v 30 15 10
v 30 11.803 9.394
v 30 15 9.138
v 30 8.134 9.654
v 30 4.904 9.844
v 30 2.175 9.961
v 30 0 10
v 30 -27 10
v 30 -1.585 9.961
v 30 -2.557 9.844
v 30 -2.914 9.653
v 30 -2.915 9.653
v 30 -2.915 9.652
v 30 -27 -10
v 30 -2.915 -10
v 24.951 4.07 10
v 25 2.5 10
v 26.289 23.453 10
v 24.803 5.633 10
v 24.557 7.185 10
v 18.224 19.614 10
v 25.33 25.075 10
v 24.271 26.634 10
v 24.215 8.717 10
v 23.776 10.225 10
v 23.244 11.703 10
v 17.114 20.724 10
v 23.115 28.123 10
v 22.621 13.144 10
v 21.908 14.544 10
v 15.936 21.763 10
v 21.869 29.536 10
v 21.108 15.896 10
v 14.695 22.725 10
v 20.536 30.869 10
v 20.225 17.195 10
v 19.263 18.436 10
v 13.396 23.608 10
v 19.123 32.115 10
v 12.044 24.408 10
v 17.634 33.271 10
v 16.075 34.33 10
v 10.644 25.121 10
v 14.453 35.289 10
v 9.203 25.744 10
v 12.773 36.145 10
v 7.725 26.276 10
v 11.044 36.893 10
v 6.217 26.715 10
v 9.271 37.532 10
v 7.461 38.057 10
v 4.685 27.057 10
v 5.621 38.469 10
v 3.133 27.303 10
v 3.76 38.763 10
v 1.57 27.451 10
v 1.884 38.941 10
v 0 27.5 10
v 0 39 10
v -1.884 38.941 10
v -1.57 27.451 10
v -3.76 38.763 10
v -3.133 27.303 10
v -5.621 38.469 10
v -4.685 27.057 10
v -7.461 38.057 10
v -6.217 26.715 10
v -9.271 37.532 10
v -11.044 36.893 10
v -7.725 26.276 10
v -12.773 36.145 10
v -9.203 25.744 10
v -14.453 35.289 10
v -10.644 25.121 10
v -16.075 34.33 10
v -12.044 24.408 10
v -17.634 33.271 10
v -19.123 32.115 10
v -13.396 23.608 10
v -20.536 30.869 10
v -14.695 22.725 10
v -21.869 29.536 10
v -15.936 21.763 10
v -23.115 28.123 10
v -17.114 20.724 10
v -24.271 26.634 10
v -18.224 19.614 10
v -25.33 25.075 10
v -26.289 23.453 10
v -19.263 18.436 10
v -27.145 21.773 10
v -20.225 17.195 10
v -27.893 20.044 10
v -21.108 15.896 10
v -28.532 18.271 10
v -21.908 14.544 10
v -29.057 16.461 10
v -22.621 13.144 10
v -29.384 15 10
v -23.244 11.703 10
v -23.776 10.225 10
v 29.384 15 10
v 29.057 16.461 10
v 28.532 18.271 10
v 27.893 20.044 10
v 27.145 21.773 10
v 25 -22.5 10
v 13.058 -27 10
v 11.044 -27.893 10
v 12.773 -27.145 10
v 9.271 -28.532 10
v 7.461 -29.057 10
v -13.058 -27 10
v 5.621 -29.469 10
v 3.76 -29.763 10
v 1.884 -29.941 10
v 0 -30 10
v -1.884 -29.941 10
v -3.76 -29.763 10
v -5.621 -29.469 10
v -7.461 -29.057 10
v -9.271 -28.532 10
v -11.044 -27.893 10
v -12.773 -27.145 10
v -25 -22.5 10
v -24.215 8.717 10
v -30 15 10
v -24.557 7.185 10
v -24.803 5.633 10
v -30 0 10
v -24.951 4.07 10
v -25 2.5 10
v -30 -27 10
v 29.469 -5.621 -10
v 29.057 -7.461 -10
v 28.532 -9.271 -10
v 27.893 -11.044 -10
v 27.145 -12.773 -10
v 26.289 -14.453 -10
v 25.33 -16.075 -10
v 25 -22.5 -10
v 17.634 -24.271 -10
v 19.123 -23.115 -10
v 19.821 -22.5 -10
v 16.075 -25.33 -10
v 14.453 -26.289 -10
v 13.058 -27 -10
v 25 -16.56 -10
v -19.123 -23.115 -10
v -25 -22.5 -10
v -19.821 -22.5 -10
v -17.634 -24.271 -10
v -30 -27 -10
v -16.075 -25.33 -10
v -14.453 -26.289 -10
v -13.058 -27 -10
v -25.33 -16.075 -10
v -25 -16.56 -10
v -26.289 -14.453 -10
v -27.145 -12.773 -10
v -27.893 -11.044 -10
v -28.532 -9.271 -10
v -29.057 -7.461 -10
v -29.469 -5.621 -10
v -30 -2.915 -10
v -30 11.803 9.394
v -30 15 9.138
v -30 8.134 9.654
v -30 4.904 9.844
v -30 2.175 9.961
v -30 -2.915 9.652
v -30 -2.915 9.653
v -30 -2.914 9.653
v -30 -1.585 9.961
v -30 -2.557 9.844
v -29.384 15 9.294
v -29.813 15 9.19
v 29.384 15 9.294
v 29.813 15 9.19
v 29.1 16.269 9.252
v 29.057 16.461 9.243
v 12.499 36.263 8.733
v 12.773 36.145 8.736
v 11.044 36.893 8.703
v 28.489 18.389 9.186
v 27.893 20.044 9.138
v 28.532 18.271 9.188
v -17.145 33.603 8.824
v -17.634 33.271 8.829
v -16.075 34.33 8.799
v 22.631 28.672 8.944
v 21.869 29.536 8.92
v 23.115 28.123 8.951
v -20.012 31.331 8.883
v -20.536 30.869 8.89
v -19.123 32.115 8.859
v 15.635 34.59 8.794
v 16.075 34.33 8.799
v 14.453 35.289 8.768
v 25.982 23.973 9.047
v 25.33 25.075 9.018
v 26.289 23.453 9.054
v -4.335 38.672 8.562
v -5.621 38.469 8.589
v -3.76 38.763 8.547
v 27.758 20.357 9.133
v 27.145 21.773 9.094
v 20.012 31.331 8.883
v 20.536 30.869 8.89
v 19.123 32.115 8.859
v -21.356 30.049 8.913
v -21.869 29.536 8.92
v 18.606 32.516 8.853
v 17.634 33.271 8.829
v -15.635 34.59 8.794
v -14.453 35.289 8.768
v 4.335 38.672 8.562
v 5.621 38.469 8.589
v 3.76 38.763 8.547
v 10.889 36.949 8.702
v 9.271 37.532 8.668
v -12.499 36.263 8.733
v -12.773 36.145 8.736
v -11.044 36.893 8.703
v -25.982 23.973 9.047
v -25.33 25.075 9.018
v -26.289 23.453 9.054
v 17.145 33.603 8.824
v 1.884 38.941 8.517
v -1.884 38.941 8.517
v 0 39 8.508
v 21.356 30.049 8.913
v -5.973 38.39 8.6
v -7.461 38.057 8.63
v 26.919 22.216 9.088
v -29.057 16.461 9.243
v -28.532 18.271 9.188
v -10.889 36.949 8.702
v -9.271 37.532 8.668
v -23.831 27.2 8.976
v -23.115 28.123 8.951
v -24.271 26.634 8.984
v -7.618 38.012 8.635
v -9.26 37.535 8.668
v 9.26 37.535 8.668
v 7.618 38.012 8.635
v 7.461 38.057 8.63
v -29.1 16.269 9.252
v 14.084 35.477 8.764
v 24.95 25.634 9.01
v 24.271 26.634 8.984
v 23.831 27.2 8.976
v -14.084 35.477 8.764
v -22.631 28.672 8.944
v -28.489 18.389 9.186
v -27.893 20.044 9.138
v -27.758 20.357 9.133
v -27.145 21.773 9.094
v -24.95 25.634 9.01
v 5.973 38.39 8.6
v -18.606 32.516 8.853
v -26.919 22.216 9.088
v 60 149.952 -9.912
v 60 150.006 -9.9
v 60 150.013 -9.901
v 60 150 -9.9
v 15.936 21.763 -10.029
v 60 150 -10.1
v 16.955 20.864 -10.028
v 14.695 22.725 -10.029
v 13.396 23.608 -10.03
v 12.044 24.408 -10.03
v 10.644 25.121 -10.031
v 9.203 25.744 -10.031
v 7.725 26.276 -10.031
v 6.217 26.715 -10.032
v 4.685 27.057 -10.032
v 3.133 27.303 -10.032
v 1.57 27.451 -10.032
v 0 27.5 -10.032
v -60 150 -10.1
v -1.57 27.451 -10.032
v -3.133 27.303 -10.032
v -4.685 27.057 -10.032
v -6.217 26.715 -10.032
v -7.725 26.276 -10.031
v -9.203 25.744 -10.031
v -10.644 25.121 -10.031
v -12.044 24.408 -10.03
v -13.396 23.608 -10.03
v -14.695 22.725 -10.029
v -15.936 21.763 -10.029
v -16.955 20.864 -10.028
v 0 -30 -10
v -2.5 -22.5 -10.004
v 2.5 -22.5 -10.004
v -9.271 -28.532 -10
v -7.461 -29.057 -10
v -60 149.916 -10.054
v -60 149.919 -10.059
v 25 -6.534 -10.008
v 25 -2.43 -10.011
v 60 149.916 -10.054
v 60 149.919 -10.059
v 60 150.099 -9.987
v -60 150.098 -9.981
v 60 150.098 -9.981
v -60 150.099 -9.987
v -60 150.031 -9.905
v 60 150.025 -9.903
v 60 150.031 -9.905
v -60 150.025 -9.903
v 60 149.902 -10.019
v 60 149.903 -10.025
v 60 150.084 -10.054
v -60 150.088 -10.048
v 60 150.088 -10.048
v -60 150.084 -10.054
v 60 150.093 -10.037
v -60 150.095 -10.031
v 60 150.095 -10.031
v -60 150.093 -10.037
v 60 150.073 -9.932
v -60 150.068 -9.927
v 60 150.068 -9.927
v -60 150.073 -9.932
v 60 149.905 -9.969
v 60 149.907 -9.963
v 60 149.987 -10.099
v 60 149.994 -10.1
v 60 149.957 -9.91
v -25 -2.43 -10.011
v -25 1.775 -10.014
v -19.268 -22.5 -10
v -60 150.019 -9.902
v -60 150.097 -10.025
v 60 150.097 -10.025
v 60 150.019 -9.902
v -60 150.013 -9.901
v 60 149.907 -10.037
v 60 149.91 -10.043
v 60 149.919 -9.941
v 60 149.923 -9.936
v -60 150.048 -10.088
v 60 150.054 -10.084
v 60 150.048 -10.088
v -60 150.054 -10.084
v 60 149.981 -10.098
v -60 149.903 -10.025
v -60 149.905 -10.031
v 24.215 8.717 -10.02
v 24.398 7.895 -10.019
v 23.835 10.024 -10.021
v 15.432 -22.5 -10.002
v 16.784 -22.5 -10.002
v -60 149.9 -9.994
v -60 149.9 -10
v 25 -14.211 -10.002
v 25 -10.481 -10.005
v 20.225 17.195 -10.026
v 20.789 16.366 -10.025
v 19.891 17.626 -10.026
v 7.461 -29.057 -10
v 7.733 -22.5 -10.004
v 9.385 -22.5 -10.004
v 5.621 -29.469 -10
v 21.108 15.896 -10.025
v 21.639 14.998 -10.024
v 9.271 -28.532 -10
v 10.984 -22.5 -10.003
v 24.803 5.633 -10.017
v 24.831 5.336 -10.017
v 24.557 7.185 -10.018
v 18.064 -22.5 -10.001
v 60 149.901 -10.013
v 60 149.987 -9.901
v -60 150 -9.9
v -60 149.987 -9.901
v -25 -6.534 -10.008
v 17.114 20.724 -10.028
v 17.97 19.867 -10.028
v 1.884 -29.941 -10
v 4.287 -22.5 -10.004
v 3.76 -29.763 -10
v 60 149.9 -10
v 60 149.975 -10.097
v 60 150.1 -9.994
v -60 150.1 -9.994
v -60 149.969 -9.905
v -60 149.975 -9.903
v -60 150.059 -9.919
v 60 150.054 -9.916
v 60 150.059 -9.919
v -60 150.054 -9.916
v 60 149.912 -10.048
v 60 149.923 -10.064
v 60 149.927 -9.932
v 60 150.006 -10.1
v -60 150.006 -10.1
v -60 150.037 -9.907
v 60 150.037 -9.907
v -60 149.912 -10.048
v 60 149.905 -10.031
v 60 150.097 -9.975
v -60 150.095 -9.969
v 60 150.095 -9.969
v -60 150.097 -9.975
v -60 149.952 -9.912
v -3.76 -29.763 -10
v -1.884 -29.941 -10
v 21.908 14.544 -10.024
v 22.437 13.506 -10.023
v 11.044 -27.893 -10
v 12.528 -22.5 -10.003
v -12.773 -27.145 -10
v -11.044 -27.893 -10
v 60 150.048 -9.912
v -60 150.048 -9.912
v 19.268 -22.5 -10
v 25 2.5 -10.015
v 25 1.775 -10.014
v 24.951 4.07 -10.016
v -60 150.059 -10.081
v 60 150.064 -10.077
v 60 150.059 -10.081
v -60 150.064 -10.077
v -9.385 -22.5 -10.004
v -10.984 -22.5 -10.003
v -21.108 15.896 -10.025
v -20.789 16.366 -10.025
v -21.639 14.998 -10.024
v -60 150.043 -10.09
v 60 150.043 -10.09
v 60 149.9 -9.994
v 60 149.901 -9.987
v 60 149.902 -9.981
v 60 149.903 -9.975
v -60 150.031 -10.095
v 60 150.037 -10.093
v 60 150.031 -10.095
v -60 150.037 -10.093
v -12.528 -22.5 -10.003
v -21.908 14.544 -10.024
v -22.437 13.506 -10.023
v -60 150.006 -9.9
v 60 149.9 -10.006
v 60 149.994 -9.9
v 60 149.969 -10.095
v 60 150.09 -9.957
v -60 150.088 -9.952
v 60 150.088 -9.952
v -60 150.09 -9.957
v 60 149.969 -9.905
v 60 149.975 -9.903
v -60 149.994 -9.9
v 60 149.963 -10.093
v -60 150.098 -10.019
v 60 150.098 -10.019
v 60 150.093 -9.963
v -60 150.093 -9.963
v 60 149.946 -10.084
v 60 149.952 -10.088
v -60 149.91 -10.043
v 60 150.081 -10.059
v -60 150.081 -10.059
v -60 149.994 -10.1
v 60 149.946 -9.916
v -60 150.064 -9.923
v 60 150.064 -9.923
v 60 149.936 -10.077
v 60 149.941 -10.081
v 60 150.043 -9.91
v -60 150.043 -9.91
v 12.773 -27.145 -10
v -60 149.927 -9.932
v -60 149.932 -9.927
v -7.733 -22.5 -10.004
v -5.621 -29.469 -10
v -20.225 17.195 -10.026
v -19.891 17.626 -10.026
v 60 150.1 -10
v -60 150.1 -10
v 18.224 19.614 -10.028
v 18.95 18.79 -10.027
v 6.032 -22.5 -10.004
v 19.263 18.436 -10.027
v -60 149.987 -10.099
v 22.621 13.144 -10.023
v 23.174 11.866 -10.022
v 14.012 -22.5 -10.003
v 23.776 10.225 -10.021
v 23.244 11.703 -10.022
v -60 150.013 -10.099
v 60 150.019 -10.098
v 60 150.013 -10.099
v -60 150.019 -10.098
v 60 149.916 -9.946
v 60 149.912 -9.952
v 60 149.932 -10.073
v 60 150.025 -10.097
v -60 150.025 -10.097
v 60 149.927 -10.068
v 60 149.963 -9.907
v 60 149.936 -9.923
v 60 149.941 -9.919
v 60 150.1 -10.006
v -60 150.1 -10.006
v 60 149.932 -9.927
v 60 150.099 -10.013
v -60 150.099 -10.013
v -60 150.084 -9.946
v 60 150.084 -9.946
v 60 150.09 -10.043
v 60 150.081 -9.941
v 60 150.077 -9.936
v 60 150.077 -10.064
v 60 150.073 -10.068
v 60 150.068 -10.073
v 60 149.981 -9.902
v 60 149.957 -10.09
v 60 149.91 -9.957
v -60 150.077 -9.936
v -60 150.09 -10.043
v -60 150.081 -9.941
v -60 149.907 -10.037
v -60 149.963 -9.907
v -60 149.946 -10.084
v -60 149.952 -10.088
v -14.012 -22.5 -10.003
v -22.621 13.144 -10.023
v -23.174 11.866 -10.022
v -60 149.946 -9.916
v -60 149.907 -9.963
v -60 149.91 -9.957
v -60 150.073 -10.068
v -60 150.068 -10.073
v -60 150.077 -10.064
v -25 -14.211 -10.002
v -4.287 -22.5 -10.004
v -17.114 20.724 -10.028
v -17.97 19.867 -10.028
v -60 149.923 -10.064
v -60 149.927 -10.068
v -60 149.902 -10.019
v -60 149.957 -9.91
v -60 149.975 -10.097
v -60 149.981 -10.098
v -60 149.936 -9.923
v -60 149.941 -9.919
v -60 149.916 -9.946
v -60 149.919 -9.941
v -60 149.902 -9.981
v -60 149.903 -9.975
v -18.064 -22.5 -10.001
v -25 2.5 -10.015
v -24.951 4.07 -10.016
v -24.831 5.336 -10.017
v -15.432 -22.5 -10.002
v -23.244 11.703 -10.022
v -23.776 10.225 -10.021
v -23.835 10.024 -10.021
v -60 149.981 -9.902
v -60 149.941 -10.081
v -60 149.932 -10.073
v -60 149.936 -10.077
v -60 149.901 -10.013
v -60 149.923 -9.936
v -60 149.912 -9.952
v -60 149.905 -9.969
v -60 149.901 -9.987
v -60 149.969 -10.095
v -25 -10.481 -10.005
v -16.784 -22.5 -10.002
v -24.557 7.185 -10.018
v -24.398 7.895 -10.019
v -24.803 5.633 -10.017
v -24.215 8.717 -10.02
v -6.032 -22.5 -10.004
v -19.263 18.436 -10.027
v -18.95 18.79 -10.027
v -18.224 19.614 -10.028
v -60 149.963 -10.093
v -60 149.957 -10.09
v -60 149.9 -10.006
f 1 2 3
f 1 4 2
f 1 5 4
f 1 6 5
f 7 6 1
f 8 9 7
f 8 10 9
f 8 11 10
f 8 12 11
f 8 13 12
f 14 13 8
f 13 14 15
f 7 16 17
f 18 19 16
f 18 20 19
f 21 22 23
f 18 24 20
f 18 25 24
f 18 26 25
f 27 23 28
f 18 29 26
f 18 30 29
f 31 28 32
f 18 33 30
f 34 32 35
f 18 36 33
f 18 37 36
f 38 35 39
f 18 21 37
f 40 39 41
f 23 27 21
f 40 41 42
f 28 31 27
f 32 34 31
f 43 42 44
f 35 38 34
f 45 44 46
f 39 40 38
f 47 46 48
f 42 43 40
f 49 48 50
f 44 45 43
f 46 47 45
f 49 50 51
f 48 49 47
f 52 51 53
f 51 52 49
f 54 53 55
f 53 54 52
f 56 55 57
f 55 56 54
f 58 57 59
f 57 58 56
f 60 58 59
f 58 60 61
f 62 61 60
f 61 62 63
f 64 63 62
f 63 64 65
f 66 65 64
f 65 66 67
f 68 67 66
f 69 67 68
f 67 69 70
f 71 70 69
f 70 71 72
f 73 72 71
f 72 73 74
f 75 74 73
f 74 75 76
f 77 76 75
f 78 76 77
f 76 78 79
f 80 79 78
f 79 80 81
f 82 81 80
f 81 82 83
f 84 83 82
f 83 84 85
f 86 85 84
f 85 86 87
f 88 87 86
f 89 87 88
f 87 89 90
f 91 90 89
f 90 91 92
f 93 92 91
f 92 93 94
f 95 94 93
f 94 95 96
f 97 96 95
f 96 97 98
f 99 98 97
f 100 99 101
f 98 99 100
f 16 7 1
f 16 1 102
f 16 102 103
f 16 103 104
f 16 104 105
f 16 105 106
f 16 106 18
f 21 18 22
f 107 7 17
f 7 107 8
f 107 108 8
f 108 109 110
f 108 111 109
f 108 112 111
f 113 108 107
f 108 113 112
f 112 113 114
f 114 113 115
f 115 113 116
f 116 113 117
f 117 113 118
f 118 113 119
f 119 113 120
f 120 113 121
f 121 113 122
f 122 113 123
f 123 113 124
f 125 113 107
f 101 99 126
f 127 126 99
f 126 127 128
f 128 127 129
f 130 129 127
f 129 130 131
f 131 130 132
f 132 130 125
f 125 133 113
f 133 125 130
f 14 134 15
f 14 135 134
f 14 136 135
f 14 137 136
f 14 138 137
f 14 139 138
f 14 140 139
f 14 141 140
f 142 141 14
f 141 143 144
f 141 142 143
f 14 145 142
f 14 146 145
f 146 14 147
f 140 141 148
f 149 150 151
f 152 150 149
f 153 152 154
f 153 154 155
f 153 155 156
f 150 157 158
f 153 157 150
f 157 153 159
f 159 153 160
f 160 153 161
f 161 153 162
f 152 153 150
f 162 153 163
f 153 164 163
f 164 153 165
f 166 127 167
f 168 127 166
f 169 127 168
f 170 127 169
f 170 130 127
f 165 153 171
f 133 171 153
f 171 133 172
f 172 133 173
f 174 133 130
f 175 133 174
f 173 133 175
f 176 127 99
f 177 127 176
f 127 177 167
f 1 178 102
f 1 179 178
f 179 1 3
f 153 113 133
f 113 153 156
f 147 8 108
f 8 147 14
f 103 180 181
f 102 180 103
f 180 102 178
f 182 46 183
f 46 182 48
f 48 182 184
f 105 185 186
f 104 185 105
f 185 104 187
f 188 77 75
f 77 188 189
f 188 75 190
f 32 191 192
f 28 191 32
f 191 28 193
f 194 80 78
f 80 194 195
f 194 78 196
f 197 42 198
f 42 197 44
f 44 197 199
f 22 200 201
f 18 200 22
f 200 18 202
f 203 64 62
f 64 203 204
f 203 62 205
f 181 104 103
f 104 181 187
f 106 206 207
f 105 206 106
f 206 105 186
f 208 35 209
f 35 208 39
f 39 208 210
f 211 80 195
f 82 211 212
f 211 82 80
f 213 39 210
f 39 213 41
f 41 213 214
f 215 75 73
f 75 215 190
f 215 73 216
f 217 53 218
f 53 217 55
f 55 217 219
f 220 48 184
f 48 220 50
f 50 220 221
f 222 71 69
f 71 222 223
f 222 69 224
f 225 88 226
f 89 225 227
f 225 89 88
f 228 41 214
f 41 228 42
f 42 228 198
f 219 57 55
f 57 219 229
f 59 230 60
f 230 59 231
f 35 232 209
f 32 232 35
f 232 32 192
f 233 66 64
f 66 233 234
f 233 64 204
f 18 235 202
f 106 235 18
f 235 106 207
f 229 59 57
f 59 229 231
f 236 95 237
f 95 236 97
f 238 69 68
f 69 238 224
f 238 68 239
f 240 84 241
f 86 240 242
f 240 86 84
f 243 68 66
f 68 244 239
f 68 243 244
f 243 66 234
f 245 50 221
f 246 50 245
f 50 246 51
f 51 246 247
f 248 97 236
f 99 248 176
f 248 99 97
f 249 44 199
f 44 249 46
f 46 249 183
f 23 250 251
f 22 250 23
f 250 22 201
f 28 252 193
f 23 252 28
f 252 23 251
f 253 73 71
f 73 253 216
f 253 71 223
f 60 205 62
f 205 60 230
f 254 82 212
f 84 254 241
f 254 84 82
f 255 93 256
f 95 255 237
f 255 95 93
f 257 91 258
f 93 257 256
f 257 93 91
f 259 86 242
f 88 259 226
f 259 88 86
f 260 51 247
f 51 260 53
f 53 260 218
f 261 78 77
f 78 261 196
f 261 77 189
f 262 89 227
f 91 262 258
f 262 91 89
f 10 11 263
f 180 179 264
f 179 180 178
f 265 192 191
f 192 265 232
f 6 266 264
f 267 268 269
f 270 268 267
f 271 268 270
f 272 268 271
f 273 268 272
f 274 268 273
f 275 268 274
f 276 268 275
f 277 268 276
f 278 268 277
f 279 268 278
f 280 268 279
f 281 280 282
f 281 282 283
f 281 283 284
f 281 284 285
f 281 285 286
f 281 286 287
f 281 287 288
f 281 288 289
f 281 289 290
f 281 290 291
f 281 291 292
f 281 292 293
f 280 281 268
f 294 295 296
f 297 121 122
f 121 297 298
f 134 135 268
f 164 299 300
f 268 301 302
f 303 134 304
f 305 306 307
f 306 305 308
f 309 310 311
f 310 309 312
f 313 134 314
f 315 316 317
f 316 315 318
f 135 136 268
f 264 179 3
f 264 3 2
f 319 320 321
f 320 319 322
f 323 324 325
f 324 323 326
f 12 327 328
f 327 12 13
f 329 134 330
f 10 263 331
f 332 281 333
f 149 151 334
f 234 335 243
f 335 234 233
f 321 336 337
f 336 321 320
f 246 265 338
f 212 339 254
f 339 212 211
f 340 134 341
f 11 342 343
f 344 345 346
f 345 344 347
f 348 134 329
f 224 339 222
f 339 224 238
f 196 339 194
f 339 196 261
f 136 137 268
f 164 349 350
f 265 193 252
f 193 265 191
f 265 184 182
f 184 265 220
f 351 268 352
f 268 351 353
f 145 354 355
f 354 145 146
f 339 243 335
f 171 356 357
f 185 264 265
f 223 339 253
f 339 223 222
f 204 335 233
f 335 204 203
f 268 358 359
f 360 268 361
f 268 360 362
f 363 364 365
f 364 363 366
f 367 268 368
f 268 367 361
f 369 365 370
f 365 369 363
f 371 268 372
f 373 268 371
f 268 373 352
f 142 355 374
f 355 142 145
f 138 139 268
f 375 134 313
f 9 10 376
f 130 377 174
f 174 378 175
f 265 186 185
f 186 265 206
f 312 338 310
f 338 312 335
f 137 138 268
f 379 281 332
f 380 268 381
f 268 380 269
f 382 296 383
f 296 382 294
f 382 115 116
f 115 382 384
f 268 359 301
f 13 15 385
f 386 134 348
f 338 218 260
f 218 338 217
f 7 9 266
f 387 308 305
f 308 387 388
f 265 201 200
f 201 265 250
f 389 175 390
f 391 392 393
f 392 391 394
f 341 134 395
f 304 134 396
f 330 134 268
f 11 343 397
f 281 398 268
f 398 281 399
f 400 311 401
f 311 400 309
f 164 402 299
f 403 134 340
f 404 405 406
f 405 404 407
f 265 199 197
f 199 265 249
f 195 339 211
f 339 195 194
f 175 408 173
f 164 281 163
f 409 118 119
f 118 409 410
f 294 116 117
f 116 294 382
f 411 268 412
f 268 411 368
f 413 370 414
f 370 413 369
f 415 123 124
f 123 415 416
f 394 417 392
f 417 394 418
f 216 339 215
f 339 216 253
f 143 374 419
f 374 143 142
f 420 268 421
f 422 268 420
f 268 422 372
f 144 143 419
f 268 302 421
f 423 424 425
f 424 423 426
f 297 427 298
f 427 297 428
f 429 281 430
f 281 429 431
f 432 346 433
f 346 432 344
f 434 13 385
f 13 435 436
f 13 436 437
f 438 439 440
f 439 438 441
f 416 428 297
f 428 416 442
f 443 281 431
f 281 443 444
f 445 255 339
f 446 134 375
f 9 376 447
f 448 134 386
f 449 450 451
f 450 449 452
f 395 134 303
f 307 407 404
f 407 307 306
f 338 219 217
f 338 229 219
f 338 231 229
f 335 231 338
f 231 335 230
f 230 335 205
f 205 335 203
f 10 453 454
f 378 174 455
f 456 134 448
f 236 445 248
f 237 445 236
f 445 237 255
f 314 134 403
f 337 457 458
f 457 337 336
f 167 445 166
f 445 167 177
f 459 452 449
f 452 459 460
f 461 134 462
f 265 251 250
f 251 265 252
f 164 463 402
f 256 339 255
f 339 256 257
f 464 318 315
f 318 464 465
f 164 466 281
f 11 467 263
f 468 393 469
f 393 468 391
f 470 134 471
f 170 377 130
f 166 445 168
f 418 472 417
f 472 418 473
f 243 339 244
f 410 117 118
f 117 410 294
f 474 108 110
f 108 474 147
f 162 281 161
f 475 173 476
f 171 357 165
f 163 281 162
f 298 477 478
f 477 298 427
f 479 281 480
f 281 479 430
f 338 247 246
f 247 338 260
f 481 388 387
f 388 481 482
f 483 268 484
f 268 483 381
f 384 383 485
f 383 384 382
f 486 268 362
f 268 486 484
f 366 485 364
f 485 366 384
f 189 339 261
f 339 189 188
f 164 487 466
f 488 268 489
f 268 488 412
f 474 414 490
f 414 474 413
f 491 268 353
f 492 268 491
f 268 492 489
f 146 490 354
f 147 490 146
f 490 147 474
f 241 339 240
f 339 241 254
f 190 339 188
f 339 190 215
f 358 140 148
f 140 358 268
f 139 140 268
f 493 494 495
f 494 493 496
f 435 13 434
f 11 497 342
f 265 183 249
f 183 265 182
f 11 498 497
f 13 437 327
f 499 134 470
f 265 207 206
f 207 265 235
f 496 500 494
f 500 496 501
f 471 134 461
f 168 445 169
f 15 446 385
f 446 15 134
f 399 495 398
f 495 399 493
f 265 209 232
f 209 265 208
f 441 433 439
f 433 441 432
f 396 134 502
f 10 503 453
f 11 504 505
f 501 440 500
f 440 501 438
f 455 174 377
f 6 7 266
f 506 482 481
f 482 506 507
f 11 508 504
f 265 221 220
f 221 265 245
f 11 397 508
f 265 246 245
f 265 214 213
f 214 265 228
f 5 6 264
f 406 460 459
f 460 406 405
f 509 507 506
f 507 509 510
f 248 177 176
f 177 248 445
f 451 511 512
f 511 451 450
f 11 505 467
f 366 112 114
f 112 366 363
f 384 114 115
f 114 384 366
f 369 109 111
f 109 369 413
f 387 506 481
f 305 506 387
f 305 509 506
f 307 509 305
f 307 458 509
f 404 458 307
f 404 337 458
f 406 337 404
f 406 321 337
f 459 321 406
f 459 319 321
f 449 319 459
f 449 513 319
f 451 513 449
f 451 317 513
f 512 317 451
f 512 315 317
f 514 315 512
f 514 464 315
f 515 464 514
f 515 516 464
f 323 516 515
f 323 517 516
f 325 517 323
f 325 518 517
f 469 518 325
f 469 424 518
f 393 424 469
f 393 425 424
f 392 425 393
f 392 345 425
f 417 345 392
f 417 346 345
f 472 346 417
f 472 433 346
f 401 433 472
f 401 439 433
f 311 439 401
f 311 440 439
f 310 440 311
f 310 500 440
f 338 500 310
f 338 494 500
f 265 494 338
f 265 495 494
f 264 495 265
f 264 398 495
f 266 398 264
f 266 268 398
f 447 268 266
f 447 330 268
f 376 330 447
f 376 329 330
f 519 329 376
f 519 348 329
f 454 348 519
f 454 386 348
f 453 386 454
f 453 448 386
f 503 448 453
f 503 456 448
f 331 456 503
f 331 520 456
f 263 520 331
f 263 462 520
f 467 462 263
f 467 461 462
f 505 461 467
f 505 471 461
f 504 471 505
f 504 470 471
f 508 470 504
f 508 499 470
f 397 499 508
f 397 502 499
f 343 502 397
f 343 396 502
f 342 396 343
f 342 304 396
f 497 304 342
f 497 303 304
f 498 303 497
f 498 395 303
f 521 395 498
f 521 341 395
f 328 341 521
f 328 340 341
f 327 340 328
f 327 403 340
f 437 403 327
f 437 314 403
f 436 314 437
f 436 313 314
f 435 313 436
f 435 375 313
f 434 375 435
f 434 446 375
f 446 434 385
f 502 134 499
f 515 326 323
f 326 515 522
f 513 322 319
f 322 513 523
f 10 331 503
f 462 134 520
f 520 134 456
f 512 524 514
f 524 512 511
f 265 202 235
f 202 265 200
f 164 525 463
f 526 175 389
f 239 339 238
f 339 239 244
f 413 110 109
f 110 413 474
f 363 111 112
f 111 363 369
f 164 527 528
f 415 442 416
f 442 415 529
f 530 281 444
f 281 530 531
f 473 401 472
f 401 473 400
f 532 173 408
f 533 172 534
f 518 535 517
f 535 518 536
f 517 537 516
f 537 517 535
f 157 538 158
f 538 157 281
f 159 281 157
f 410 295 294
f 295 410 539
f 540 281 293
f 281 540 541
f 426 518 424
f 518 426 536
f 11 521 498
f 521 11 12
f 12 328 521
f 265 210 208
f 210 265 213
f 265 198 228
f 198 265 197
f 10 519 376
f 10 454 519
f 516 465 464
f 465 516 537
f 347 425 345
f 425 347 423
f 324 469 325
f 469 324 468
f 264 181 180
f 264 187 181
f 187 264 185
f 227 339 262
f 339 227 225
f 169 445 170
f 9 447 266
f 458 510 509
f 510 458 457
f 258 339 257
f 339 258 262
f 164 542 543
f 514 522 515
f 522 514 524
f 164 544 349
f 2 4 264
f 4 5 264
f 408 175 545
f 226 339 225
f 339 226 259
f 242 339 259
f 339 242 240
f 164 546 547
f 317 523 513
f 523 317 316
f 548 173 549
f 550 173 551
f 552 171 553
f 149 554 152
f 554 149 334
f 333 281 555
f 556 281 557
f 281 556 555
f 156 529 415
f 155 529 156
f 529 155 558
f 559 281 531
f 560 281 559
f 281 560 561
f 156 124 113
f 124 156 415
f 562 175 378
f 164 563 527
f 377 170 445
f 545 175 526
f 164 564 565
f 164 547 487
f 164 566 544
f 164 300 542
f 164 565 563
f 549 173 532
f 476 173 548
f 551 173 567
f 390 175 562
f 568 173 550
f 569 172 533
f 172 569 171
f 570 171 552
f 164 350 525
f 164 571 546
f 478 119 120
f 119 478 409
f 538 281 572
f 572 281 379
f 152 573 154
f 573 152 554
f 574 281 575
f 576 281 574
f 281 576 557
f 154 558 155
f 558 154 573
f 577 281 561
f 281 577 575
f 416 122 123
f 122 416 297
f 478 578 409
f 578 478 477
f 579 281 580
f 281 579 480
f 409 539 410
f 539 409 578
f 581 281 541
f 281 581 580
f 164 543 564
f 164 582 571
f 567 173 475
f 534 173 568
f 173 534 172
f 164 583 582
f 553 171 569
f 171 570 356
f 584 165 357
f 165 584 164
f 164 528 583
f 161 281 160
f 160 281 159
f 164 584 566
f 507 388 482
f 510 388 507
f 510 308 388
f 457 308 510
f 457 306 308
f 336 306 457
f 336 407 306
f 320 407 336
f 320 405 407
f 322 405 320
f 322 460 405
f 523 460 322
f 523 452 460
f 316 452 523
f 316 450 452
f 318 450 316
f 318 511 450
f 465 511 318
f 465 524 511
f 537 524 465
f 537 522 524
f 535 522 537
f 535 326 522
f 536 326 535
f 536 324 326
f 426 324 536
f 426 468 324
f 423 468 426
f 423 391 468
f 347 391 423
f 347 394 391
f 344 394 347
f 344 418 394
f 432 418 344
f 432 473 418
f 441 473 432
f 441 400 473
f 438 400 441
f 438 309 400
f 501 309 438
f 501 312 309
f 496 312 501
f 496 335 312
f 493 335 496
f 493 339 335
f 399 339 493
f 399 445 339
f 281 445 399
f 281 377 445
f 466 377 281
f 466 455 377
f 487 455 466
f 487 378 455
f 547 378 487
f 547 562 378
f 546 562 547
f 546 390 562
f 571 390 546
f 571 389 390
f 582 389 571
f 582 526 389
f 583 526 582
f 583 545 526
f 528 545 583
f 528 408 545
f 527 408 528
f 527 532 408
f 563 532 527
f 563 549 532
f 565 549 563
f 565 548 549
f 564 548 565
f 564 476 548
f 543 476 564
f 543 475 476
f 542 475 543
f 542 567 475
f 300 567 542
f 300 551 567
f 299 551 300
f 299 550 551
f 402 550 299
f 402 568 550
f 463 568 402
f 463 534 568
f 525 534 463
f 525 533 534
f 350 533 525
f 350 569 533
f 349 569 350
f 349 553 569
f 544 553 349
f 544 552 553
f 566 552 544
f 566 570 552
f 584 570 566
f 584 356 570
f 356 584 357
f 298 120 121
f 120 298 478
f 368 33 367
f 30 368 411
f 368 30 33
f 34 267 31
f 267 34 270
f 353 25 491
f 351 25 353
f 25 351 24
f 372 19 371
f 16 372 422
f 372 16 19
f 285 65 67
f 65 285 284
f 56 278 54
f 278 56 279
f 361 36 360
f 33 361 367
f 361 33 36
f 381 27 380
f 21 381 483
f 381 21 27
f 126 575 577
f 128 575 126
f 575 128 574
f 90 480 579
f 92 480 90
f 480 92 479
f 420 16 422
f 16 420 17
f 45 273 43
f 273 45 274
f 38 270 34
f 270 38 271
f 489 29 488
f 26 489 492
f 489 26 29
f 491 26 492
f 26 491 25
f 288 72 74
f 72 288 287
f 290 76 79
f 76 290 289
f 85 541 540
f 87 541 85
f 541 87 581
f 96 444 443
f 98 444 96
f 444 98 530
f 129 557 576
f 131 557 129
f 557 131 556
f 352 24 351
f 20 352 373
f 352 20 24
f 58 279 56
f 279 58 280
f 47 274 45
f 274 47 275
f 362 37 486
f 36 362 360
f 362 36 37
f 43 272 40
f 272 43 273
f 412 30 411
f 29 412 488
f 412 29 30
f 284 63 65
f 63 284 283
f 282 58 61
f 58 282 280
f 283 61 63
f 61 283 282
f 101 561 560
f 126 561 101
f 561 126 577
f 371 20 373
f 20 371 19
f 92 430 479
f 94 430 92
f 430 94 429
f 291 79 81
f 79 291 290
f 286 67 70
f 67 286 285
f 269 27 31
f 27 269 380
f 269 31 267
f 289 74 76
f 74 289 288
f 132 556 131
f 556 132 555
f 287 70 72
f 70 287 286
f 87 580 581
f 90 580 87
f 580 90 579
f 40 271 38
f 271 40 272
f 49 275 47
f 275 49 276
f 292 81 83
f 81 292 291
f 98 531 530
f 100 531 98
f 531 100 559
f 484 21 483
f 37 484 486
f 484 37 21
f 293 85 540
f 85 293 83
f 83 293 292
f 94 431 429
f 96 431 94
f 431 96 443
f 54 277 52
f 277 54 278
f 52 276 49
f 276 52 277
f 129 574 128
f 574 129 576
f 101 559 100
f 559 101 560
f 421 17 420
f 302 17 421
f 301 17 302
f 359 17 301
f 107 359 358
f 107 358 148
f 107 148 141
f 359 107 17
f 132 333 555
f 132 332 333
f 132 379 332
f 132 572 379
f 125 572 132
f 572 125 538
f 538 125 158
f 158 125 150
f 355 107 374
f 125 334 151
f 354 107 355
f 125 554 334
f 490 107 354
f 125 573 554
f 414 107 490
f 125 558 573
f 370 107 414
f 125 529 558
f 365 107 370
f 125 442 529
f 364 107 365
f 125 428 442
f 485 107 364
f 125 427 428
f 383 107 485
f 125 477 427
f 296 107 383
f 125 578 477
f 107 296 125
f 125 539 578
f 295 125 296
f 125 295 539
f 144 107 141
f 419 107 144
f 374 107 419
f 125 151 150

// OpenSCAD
// Customizable simple hoe head

//Customizer Variables

//axe head back
r= 60; //[1:200]

//resolution
n=100; //[1:200]

//hoe head height
h=20; //[1:500]

// handle hole radius
x=25; // 

//scale LENGTH OF HOE
s=150; //

// base blade thickness
b=30;//

// blade width
w=120;

l=50;

module chuck(){
	union(){
translate([0,-0.1*r,0])cube([r,0.7*r,h], center = true);
translate([0,0.3*r/2,0])cylinder(h = h, r1 = r/2, r2 = r/2, center = true, $fn=n);
}
}

module chunk(){
chuck();
hull(){
cylinder(h = h, r1 = b, r2 = b, center = true, $fn=n);
translate([0,s,-h/2])rotate([0,90,0])cylinder(h = w, r1 = 0.1, r2 = 0.1, center = true, $fn=n);
				}
}

module hoe(){
	difference(){
	chunk();	
	translate([0,x*.1,0])cylinder(h = h+l+1, r1 = x, r2 = x, center = true, $fn=n); //HANDLE HOL
	translate([-x,-x*.9,-h/2-1])cube([2*x, x,h+l+1,]); //SQUARE HANDLE HOLE
	}
					}
hoe();
